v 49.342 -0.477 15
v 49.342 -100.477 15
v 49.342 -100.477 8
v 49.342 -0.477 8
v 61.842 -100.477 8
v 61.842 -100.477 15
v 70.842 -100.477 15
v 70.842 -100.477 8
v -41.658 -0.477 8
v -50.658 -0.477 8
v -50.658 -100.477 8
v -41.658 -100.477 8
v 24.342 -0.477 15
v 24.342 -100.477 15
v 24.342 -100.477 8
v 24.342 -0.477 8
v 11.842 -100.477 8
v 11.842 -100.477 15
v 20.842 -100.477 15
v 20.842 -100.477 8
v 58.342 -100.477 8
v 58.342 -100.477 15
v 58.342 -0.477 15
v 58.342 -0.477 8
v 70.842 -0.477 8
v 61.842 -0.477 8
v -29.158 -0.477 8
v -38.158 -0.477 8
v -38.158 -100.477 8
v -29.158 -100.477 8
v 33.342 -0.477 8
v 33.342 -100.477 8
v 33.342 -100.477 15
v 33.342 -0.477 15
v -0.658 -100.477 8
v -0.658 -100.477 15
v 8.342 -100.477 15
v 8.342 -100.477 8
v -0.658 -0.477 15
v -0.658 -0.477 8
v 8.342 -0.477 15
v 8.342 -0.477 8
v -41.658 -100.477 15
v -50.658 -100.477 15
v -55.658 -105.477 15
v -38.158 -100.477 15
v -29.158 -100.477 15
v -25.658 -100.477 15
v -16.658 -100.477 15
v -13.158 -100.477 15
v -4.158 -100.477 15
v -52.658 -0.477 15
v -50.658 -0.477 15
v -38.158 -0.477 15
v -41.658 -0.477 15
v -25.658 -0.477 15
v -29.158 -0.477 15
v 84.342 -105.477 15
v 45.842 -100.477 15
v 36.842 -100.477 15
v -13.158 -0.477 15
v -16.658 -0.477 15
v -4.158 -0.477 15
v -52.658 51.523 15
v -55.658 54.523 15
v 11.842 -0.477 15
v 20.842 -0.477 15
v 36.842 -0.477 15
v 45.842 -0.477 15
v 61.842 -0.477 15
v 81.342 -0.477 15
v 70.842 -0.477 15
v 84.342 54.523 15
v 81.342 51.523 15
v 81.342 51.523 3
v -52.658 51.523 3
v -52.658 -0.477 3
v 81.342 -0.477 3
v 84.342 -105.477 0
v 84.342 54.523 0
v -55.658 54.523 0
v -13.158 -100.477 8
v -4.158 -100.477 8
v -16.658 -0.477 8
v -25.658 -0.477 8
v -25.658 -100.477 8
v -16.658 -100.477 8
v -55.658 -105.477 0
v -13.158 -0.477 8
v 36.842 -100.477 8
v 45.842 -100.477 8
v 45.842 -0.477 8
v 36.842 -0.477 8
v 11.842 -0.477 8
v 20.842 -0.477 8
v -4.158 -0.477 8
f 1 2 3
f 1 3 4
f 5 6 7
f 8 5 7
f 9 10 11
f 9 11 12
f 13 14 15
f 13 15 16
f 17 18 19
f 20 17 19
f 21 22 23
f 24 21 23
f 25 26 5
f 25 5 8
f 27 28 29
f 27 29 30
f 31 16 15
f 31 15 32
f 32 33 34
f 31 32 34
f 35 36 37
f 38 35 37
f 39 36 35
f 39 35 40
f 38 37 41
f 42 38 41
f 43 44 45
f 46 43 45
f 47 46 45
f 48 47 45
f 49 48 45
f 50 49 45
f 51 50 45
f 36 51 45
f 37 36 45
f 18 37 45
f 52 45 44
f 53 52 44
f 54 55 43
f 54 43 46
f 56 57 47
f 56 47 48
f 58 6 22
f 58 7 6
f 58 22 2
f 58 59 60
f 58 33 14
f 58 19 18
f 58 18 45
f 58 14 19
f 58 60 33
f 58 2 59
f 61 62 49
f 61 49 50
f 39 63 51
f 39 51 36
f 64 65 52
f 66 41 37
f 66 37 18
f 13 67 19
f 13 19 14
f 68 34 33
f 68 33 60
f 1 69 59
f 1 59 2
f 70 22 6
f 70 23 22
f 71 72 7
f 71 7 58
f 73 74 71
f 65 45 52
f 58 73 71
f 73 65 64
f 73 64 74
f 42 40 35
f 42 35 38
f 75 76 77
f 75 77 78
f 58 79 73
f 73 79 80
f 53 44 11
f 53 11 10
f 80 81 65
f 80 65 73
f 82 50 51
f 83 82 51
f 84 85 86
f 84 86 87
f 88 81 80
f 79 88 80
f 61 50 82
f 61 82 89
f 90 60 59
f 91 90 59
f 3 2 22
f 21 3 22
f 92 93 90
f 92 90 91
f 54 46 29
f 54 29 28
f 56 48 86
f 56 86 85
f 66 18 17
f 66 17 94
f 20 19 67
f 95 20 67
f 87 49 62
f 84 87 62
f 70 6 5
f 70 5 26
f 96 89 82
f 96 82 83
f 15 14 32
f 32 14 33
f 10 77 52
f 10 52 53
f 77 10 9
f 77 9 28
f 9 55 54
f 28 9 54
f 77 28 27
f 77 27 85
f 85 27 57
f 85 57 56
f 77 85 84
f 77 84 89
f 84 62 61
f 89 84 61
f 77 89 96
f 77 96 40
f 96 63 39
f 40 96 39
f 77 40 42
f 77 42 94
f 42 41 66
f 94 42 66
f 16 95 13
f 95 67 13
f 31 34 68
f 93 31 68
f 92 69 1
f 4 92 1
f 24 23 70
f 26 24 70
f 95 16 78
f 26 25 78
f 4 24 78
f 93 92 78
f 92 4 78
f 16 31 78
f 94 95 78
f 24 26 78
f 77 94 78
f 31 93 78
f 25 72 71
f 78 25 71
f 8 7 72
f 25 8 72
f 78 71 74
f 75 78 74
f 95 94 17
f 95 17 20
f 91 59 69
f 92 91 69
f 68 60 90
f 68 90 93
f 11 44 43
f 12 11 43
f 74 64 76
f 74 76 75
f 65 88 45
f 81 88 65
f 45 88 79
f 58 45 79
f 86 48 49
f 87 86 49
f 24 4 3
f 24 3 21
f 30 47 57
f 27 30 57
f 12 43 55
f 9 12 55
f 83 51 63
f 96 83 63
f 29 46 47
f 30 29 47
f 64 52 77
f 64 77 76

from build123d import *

# Parameters (mm, degrees)
F0_W     = 140
F0_H     = 160
F1_DEPTH = 15
F2_W     = 134
F2_H     = 52
F3_DEPTH = 12
F4_W     = 9
F4_H     = 100
F5_DEPTH = 7


with BuildPart() as f1:
    # F0 (on Top) → F1 (new body)
    with BuildSketch(Plane.XY):
        with Locations((14.341742, -25.477314)):
            Rectangle(F0_W, F0_H)
    extrude(amount=F1_DEPTH)

    # F2 (on face) → F3 (cut)
    with BuildSketch(Plane.XY.offset(15)):
        with Locations((14.341742, 25.522686)):
            Rectangle(F2_W, F2_H)
    extrude(amount=-F3_DEPTH, mode=Mode.SUBTRACT)

    # F4 (on face) → F5 (cut)
    with BuildSketch(Plane.XY.offset(15)):
        with Locations((-46.158258, -50.477314)):
            Rectangle(F4_W, F4_H)
        with Locations((-33.658258, -50.477314)):
            Rectangle(F4_W, F4_H)
        with Locations((-8.658258, -50.477314)):
            Rectangle(F4_W, F4_H)
        with Locations((3.841742, -50.477314)):
            Rectangle(F4_W, F4_H)
        with Locations((28.841742, -50.477314)):
            Rectangle(F4_W, F4_H)
        with Locations((41.341742, -50.477314)):
            Rectangle(F4_W, F4_H)
        with Locations((53.841742, -50.477314)):
            Rectangle(F4_W, F4_H)
        with Locations((66.341742, -50.477314)):
            Rectangle(F4_W, F4_H)
        with Locations((16.341742, -50.477314)):
            Rectangle(F4_W, F4_H)
        with Locations((-21.158258, -50.477314)):
            Rectangle(F4_W, F4_H)
    extrude(amount=-F5_DEPTH, mode=Mode.SUBTRACT)


solid = f1.part
